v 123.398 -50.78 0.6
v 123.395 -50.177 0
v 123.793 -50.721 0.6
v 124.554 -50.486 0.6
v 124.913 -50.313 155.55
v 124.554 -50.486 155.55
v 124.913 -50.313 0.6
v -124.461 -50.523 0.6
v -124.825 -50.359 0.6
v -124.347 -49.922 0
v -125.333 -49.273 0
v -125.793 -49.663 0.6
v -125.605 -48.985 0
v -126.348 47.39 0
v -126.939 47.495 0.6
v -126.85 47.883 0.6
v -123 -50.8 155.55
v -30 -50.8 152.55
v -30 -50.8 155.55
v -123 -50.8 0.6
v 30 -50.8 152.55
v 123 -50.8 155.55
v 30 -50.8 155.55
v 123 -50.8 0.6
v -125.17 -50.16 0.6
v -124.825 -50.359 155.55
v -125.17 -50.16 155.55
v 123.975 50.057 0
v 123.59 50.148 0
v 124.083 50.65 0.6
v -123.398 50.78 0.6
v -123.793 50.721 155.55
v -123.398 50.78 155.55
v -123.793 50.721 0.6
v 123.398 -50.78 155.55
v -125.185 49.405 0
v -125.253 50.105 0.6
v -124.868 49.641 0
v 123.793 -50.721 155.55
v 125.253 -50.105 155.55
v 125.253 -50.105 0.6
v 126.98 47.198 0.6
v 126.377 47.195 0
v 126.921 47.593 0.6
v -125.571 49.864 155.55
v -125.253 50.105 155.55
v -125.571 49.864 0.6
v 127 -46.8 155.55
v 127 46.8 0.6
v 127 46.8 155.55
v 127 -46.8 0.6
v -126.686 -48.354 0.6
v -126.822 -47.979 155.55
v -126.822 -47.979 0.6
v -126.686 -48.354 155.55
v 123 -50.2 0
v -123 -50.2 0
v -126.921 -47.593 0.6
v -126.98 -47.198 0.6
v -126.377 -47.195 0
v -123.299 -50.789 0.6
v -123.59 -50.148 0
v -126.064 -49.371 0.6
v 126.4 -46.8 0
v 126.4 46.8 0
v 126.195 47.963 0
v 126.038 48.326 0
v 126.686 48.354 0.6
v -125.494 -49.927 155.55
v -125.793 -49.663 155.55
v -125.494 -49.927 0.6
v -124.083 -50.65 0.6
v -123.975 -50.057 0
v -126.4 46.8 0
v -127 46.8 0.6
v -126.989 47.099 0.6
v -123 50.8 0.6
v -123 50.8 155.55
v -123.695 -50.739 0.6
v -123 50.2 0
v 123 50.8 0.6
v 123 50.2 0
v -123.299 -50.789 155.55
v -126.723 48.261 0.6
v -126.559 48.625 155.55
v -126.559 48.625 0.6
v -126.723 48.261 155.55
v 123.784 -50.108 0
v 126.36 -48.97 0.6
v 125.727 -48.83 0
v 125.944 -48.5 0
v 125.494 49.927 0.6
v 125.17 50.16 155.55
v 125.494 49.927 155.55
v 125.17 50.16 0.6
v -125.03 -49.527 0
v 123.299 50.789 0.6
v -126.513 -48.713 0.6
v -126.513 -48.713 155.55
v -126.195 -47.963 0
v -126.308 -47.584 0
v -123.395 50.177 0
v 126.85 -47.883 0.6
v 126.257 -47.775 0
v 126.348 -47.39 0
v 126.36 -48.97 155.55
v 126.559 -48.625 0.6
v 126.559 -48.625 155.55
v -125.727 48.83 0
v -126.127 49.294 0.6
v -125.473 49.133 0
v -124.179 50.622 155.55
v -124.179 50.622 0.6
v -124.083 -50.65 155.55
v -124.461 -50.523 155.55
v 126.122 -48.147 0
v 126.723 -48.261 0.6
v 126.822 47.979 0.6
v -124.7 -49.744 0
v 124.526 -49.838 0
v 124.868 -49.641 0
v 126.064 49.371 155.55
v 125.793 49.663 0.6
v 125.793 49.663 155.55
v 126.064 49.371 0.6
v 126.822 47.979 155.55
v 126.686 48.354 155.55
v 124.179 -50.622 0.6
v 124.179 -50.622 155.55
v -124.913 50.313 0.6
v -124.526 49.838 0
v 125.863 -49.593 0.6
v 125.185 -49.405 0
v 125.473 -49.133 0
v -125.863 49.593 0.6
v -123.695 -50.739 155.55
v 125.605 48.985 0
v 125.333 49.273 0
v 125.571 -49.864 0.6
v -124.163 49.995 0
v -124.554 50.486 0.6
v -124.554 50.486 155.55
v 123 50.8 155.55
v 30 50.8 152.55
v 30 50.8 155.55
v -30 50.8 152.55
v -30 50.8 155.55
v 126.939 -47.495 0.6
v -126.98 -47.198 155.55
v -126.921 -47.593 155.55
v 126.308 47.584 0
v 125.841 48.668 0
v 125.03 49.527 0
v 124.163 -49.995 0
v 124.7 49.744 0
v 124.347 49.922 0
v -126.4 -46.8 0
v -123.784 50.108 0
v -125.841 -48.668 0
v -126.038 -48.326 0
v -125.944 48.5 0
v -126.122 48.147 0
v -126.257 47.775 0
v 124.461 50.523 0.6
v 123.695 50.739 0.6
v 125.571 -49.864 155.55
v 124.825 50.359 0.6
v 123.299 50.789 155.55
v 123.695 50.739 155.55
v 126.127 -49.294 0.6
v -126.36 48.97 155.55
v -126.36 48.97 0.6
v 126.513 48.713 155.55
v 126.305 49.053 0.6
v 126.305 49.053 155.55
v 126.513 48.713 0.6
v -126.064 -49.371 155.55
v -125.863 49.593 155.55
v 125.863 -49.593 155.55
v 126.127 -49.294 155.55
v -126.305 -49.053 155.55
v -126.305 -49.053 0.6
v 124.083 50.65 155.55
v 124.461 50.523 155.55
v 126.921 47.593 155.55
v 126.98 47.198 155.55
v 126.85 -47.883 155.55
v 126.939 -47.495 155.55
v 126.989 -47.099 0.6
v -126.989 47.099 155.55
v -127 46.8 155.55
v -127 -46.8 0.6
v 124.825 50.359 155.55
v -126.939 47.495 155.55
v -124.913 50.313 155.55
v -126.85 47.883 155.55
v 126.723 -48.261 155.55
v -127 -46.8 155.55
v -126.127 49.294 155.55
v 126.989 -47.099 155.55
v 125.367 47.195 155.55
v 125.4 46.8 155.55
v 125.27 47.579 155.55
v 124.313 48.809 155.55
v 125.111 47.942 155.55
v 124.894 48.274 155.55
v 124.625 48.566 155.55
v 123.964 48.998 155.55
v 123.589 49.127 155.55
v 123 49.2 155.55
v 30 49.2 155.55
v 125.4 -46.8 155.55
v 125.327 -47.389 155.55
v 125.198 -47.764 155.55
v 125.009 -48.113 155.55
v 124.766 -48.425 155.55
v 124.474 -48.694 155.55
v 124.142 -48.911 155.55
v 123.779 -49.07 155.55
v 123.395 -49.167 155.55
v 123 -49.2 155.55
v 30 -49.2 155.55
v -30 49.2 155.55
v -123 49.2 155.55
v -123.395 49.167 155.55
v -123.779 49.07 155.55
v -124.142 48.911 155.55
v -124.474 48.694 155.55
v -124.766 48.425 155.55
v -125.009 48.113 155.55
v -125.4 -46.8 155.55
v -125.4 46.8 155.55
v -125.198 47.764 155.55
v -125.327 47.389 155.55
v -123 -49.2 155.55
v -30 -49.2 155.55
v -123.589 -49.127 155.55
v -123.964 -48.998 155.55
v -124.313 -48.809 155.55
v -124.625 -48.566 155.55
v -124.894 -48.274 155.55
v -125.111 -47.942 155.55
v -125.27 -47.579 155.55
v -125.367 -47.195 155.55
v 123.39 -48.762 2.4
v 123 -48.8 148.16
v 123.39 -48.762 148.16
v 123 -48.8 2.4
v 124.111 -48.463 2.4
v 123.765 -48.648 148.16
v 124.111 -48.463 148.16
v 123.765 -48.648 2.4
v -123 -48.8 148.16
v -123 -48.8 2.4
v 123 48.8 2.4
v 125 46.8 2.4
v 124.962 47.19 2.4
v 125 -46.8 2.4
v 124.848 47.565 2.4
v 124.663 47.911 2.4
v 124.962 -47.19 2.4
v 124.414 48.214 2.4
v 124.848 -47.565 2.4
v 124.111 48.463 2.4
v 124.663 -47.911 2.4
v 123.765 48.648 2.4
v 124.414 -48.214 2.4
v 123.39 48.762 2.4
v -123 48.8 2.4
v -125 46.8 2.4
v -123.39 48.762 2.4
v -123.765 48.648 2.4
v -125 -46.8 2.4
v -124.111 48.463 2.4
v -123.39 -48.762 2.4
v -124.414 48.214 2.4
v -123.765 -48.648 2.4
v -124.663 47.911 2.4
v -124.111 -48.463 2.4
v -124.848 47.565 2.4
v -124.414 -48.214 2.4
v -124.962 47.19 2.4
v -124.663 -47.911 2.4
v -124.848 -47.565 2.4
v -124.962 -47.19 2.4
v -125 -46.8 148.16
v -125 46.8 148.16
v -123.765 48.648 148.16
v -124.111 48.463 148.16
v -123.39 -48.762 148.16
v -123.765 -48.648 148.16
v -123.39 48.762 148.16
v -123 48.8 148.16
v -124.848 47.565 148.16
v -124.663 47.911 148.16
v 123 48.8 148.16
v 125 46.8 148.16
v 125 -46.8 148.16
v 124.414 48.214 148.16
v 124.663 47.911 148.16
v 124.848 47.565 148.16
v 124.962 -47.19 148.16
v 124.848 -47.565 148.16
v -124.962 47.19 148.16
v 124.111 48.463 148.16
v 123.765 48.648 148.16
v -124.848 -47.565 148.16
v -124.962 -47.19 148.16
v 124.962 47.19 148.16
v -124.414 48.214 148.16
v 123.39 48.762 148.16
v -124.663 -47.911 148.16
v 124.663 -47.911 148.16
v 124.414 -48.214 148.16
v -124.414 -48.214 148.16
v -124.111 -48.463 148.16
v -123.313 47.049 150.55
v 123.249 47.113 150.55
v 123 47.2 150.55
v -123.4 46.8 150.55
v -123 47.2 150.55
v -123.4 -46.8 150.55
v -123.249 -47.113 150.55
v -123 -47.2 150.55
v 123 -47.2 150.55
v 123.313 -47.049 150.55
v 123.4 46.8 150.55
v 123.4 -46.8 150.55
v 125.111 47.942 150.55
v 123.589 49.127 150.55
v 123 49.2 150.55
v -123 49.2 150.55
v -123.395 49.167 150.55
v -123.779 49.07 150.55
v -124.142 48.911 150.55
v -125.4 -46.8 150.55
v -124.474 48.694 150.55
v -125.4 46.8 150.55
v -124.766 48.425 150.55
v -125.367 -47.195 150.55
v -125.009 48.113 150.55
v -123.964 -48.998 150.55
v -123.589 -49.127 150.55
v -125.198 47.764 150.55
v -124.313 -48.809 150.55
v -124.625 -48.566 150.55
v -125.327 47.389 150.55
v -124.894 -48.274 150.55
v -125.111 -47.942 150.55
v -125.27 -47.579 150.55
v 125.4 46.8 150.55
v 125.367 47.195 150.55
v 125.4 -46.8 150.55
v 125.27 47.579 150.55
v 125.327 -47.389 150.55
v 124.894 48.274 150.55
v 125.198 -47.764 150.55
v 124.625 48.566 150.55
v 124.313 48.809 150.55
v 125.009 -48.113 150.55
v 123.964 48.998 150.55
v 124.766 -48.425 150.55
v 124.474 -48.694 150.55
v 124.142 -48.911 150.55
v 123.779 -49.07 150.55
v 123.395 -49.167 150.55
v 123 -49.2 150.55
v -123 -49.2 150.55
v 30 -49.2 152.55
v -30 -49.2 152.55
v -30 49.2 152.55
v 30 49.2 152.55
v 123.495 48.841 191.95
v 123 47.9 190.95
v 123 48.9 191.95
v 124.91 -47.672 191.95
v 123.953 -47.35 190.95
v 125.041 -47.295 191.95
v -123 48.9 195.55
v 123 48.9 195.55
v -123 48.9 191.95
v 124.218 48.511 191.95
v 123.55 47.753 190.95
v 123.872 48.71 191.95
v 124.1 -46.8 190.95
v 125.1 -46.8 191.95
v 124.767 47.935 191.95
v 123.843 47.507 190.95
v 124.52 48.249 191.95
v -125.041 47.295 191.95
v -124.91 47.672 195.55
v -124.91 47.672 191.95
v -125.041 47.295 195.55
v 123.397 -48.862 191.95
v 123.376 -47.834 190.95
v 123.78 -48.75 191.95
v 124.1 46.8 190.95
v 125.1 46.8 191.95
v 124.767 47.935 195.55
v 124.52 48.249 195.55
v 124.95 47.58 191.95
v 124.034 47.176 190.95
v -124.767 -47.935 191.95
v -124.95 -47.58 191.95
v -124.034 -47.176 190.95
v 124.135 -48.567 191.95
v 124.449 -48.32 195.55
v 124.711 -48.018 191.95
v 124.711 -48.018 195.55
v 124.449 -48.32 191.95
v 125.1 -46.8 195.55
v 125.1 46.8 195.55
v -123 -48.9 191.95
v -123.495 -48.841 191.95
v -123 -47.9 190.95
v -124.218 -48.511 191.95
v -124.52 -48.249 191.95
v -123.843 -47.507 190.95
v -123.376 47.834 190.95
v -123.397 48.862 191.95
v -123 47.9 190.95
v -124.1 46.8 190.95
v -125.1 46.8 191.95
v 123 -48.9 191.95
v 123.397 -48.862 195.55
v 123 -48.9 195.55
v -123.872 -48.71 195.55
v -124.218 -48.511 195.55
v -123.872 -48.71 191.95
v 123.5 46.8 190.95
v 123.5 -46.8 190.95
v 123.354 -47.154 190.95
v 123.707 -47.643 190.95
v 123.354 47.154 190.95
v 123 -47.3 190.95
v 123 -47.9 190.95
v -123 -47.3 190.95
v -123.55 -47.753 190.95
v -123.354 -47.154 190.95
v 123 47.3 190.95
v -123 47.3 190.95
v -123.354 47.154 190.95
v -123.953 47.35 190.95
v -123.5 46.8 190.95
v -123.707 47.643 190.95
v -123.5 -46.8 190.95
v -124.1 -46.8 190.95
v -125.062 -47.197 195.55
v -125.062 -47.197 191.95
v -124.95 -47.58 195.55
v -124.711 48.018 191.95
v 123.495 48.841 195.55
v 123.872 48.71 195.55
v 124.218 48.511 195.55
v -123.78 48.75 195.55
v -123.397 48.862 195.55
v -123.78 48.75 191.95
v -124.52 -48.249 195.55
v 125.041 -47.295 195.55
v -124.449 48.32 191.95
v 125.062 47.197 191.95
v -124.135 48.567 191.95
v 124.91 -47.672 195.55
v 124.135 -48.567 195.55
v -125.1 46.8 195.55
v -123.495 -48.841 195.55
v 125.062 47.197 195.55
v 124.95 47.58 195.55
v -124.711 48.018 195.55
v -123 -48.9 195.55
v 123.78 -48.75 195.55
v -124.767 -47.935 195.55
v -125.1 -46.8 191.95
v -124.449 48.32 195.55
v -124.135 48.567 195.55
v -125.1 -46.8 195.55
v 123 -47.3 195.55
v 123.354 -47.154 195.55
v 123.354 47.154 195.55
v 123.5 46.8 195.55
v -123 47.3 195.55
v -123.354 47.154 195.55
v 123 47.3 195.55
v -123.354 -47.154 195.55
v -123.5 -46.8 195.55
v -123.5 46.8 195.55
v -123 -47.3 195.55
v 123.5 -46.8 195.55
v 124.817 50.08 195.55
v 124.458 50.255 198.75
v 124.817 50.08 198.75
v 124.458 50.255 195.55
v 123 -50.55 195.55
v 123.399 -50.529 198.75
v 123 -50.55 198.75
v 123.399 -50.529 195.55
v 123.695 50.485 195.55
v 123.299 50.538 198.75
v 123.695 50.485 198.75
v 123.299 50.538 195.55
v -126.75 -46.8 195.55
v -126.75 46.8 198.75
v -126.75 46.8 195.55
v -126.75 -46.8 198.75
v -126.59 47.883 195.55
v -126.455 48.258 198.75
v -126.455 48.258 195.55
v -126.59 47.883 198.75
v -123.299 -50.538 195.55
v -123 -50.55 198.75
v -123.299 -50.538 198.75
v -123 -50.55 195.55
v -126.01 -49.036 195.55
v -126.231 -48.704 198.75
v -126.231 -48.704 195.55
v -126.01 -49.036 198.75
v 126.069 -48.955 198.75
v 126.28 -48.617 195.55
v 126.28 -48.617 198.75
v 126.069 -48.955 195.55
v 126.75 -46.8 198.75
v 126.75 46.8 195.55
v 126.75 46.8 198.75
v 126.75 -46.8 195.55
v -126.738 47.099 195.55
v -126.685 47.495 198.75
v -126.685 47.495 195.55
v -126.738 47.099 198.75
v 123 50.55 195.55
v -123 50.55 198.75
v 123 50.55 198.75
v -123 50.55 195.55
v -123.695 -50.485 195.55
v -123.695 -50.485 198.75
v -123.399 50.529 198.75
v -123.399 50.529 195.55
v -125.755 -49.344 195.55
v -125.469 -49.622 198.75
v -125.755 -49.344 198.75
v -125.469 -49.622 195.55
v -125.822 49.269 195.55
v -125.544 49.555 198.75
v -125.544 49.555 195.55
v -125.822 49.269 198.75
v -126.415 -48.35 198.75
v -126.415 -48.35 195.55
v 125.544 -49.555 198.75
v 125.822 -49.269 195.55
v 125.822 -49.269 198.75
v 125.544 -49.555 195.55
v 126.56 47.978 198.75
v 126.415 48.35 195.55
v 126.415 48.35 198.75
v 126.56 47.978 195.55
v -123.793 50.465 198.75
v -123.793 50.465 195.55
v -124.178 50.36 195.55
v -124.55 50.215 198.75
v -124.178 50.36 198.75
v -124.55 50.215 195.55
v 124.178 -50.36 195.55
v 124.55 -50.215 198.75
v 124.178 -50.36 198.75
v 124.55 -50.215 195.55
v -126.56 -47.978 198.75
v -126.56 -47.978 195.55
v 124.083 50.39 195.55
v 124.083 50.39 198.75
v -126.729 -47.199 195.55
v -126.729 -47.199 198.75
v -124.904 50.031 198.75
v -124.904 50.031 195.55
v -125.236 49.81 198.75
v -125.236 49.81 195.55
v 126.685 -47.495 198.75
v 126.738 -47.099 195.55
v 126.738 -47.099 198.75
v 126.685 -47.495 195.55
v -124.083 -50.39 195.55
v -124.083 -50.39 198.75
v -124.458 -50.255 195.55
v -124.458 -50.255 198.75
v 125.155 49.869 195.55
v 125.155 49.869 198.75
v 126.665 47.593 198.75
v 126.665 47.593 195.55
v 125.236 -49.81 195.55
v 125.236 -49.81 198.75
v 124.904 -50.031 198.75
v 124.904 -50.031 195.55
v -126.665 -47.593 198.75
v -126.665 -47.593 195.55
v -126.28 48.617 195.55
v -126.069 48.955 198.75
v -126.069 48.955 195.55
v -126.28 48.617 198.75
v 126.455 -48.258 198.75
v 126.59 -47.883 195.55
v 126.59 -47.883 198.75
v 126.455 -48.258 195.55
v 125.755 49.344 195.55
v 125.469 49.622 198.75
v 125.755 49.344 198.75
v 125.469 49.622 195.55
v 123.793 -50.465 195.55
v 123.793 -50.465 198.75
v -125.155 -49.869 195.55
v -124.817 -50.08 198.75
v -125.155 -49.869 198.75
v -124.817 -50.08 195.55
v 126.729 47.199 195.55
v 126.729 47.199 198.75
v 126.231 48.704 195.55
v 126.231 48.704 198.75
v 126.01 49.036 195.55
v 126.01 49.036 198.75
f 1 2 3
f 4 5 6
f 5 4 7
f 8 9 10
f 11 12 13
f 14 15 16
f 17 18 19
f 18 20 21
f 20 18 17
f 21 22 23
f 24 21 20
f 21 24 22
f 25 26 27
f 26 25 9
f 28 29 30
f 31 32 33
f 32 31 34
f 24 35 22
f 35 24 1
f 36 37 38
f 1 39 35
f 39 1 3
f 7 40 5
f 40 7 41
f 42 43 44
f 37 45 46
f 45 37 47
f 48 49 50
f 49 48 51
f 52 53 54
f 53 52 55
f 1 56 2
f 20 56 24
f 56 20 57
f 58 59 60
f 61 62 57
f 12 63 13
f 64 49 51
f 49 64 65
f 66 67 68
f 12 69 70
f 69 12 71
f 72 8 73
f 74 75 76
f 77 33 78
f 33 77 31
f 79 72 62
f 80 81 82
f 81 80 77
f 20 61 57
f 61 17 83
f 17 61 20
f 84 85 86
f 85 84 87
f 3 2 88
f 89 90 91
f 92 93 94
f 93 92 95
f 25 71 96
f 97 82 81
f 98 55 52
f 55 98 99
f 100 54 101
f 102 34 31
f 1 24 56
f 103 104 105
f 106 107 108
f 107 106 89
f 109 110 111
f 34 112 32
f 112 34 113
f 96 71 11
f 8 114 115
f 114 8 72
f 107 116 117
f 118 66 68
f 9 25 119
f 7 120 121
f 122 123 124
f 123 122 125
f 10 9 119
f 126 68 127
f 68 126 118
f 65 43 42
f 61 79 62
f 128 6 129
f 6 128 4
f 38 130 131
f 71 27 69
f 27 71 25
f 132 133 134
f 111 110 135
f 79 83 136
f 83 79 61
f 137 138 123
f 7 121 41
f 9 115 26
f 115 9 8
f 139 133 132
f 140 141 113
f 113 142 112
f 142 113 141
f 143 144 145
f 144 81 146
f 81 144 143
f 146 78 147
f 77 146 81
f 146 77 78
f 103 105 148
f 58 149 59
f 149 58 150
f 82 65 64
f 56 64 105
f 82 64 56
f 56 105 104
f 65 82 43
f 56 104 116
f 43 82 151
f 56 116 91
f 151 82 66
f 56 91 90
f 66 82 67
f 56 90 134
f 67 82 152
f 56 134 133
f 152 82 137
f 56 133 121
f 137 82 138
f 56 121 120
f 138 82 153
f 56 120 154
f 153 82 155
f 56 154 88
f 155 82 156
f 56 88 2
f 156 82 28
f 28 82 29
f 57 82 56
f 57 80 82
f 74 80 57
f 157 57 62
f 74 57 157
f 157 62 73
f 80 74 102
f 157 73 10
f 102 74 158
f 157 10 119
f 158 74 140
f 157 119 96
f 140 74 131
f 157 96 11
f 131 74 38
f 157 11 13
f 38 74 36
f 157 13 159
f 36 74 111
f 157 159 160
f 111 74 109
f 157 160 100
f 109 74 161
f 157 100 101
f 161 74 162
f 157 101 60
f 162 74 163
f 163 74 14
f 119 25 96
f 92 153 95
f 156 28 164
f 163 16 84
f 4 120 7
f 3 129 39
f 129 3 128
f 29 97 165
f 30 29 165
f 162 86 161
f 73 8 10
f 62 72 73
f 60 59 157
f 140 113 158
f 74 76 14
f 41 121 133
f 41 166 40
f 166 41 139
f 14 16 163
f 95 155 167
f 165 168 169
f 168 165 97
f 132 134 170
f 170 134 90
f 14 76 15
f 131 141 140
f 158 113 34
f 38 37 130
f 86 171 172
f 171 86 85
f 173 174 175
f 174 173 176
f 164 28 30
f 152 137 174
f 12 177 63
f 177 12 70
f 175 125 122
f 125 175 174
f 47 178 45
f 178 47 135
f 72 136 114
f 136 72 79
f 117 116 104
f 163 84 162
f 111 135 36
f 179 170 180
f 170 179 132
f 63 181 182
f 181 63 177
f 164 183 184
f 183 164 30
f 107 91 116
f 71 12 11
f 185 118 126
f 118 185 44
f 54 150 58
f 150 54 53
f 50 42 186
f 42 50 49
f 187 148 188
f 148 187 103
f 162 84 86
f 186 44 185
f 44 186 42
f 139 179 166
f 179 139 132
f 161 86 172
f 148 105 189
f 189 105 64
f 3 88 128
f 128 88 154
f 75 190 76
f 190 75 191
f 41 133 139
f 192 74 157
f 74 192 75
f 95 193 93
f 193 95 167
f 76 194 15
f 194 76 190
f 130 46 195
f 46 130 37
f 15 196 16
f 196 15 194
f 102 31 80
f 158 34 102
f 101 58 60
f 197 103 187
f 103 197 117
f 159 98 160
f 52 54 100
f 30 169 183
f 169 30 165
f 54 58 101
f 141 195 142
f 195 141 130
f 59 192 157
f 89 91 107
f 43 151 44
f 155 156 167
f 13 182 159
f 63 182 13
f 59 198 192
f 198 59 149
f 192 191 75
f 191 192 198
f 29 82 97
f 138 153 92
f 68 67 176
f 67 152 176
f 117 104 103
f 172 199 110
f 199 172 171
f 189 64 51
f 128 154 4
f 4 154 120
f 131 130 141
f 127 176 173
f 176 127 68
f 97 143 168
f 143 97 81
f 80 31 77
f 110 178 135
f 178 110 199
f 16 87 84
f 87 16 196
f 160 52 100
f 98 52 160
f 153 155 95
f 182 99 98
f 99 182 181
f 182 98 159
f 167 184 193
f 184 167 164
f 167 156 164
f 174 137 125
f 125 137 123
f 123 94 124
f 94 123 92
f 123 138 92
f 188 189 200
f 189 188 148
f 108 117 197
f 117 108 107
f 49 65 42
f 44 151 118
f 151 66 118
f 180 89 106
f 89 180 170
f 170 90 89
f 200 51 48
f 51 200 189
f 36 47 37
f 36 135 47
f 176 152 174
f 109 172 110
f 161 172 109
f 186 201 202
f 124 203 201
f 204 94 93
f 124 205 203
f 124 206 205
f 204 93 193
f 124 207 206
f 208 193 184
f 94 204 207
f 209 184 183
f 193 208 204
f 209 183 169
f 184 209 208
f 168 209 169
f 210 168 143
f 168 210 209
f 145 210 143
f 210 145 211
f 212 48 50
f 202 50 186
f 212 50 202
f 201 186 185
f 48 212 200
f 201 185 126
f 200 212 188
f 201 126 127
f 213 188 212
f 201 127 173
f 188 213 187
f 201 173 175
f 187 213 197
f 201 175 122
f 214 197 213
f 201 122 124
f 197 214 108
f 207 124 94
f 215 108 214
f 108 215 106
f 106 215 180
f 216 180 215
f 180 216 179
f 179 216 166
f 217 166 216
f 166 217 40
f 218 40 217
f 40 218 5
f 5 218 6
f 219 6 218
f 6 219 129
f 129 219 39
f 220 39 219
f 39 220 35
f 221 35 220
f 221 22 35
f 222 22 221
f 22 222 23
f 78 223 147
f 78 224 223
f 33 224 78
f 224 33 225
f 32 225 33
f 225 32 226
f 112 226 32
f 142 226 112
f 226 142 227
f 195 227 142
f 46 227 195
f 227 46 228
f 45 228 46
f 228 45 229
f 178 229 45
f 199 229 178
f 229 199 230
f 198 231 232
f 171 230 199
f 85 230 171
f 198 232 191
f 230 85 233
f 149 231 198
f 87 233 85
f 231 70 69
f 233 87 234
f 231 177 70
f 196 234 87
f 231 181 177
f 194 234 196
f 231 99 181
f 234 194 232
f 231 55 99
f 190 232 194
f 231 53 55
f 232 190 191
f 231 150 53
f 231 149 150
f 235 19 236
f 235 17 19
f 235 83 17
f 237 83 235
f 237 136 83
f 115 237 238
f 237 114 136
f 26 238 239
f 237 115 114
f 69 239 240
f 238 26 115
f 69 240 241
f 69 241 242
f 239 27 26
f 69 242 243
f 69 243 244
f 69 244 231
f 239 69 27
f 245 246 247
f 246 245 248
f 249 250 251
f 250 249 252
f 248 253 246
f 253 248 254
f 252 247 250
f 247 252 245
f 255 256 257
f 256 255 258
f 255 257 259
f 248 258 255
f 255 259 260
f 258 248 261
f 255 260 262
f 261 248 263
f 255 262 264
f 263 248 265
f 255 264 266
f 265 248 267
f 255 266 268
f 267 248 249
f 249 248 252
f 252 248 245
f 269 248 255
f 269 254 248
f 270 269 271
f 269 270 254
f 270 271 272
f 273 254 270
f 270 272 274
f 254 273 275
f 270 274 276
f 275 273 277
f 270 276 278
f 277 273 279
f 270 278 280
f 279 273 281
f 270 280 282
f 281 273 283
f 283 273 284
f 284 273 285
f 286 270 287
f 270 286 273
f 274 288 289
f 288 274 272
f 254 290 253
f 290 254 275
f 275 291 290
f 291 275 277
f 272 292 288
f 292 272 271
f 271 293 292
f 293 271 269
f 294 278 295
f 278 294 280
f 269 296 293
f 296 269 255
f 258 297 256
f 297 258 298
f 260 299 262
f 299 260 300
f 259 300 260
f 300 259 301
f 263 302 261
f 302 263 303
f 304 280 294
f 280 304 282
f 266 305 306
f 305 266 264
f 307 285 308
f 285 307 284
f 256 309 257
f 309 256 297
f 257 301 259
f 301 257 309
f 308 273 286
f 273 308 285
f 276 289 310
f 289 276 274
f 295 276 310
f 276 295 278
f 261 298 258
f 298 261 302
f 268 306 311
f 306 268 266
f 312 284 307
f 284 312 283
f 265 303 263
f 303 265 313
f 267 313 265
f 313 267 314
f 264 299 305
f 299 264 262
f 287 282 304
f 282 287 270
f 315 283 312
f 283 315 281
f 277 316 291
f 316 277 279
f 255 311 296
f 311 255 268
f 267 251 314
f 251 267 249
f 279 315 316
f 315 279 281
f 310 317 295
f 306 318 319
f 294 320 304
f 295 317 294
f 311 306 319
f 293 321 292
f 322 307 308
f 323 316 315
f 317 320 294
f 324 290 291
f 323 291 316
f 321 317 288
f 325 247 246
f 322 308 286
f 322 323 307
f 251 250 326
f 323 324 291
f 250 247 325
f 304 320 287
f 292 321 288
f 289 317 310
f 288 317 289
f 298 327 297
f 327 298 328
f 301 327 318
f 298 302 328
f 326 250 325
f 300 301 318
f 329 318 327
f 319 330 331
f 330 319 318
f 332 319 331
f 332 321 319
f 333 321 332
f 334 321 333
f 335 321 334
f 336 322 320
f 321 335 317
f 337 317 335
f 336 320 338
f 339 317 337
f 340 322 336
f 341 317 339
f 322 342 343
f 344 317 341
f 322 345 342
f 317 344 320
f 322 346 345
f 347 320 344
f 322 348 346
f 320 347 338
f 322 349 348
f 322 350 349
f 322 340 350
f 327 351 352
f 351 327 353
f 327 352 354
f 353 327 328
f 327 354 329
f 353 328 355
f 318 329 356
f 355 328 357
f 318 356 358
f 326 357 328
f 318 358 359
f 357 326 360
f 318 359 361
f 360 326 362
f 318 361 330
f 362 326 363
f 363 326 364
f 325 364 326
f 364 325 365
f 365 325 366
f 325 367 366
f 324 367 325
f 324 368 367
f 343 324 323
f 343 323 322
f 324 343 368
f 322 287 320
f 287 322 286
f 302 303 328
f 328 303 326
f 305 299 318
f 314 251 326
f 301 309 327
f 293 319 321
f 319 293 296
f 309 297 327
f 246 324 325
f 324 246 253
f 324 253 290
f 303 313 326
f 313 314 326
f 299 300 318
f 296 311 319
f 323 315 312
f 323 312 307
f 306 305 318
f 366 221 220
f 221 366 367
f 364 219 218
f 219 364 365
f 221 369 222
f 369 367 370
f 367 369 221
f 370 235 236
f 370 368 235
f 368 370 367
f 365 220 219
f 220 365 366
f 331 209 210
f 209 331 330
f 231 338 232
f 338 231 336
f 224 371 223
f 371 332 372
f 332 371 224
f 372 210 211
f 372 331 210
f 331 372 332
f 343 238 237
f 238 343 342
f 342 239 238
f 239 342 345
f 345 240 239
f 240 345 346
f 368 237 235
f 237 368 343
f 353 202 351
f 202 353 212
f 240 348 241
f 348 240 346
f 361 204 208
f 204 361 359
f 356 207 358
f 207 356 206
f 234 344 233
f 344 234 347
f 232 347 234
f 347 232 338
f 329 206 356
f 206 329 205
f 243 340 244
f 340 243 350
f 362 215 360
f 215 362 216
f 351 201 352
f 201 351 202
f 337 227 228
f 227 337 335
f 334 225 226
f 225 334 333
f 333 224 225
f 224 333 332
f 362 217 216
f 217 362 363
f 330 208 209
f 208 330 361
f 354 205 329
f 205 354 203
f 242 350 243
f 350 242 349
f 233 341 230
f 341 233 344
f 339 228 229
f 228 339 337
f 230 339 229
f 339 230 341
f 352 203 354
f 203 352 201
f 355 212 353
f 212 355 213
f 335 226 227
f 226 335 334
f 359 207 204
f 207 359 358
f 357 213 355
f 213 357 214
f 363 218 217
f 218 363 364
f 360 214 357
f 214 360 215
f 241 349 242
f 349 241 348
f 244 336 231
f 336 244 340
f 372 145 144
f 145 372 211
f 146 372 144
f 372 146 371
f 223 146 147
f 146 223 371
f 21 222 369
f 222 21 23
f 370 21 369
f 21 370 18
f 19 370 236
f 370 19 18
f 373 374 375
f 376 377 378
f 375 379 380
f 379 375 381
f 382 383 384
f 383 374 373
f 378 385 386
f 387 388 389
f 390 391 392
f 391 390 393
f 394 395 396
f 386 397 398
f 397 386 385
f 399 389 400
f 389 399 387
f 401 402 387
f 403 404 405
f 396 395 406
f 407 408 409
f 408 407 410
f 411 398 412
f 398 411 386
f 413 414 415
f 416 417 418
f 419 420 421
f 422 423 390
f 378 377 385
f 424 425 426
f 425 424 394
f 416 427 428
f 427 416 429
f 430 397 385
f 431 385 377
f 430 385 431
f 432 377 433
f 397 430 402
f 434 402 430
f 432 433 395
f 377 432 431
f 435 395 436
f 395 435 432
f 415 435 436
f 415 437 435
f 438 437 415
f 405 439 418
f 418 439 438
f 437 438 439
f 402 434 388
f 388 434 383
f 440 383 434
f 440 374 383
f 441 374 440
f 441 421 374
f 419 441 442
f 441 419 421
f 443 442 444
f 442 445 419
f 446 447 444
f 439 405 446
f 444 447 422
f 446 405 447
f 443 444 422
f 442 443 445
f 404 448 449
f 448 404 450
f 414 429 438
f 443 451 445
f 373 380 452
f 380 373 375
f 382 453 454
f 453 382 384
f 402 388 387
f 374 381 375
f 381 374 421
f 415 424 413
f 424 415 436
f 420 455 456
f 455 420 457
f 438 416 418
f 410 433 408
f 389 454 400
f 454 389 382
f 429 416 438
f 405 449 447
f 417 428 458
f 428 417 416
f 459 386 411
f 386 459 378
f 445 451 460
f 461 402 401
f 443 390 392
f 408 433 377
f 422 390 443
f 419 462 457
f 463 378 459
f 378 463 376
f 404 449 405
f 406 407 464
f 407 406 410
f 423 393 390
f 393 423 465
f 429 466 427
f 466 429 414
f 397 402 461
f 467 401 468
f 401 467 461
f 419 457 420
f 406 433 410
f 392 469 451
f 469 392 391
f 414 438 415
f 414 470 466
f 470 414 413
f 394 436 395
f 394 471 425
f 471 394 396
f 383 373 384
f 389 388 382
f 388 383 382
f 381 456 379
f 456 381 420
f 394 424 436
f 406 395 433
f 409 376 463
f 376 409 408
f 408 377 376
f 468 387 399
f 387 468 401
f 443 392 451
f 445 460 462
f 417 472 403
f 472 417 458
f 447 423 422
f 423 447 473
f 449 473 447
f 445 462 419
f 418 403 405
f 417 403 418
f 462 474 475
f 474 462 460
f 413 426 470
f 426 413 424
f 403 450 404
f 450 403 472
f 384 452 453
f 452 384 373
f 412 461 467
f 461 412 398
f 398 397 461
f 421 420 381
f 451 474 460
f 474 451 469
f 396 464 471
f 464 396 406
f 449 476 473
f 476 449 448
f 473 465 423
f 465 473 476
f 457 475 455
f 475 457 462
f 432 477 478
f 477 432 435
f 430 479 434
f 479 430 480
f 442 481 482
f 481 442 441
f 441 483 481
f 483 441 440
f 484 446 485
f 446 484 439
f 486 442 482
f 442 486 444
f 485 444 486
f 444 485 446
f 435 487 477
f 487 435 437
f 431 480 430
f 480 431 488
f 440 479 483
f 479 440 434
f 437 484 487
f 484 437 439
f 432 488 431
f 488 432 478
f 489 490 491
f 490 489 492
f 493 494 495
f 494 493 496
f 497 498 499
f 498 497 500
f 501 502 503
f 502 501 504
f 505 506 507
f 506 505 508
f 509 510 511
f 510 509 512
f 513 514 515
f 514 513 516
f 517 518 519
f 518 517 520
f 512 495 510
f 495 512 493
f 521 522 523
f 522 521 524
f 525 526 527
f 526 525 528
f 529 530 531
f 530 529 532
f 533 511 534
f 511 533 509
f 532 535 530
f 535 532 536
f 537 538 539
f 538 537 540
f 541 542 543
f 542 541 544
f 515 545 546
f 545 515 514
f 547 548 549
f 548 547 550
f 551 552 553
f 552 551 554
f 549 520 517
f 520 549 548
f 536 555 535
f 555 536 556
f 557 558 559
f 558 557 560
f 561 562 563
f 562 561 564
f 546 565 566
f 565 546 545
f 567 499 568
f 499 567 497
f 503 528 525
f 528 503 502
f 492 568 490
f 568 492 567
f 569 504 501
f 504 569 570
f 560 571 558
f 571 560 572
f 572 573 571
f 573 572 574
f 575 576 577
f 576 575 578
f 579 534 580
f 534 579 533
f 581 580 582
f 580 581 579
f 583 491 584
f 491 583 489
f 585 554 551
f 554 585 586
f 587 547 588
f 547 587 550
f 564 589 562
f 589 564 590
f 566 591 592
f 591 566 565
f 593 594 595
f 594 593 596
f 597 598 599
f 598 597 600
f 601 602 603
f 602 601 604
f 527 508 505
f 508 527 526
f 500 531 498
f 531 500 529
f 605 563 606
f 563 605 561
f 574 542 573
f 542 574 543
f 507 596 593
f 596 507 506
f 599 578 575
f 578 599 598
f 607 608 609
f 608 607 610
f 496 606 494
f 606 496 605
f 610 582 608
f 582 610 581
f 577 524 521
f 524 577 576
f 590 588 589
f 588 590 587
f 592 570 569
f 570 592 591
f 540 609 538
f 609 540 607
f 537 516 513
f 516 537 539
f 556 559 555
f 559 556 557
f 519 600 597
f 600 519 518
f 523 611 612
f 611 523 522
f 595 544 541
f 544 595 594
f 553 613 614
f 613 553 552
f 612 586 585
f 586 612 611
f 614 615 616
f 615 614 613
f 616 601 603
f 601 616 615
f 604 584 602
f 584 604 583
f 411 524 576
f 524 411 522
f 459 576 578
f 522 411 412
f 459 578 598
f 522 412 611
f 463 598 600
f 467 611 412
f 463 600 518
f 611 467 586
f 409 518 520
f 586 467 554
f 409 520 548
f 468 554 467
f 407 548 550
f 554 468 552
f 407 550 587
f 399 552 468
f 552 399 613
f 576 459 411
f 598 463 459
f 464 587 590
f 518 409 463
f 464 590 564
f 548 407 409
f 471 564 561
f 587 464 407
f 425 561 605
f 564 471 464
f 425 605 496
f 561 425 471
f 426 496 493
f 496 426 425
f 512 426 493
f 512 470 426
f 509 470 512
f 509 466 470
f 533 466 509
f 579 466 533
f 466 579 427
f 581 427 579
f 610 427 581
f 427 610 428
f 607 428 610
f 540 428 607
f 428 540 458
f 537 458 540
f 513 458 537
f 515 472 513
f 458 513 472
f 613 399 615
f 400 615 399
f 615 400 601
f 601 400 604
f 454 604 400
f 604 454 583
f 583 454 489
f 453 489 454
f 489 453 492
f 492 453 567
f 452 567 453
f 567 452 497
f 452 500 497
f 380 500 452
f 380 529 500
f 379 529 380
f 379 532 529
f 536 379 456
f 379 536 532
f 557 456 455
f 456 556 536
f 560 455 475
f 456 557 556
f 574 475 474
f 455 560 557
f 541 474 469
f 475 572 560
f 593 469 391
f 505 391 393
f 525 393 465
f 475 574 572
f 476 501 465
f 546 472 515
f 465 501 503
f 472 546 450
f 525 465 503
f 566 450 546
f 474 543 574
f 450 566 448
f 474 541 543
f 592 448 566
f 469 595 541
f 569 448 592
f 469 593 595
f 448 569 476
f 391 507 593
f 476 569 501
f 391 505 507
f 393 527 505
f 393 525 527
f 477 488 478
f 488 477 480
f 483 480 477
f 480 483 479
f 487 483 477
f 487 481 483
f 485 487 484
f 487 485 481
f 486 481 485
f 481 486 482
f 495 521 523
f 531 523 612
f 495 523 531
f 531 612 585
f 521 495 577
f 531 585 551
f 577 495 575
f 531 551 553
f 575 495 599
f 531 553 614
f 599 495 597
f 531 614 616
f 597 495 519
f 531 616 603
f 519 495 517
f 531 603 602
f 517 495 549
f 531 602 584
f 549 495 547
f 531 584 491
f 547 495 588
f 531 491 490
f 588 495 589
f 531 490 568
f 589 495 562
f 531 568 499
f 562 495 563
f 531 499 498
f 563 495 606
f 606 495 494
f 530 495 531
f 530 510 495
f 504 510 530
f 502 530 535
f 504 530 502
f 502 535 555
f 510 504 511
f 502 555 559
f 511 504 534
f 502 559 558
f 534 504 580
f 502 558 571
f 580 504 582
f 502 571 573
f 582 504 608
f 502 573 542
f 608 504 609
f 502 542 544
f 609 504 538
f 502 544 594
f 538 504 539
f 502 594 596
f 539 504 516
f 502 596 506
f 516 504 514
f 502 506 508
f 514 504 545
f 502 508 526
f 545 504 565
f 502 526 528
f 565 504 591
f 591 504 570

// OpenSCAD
// photo_box — shipping box for photos, with a proud inset lid
//
// Two parts, single-colour PLA, both print without supports.
//   box  prints open-face-up, floor on the bed
//   lid  prints top-face-down, skirt pointing up
//
// The four numbers below are the ones to change. Everything else is
// derived, so the model stays coherent at any size.

// ---- outside envelope (lid on) ----------------------------------------
// HARD CONSTRAINT. No feature on either part may exceed these in any
// axis. Grips and the like are cut *into* the envelope, never added
// outside it. Checked against the exported meshes — see SPEC.md §9.
box_w = 254;      // 10"    width
box_d = 101.6;    // 4"     depth
box_h = 158.75;   // 6.25"  height, lid seated

// ---- thicknesses ------------------------------------------------------
wall_t  = 2.0;    // side walls        (5 perimeters @ 0.4)
floor_t = 2.4;    // box floor         (6 perimeters)
lid_t   = 3.2;    // lid plate         (8 perimeters)

// ---- lid interface ----------------------------------------------------
rabbet_h = 5.0;   // how far the ledge sits below the rim
ledge_w  = 2.0;   // horizontal width of the ledge
rim_t    = 1.6;   // standing rim above the ledge (4 perimeters)
ramp_h   = 2.4;   // ramp thickening the wall into the rabbet zone. Rises 2.4
                  // while growing 1.6 inward — 34 deg off vertical, so it sits
                  // clear of the 45 deg self-support limit rather than on it.
skirt_w  = 1.6;   // lid skirt thickness (4 perimeters)
clr      = 0.3;   // lateral clearance, skirt to rim (PLA)
seat_gap = 0.4;   // skirt clears the ledge — the rim is the seat, not the ledge

// ---- cosmetic / ergonomic --------------------------------------------
corner_r   = 4.0;  // outside corner radius
lid_relief = 0.25; // lid plate inset from the outer face, per side
skirt_cham = 1.0;  // 45 deg lead-in so the lid self-centres on the way in
foot_cham  = 0.6;  // bottom outer edge — chamfer, not a round (elephant's foot)

// Nail catch: a notch taken out of the BOX rim, front and back, leaving the
// lid edge overhanging a gap you put a fingernail into. Subtractive, so the
// grip costs no envelope.
//
// It is cut from the rim rather than the lid's underside because the plate
// only overhangs the skirt by 1.65 (lid_od/2 - skirt_od/2). Chamfering the
// lid deeper than that removes the plate from under the skirt and leaves the
// skirt bridging nail_w in mid-air. The rim has depth to give; the lid
// does not.
nail_d = 3.0;      // notch depth below the rim top
nail_w = 60.0;     // span along the edge, centred

// ---- output -----------------------------------------------------------
part = "both";     // "box" | "lid" | "both"

$fa = 2;
$fs = 0.4;

// ---- derived ----------------------------------------------------------
body_h   = box_h - lid_t;        // rim top: the lid plate sits on this
ledge_z  = body_h - rabbet_h;    // up-facing ledge surface
ramp_z   = ledge_z - ramp_h;     // where the wall starts thickening
top_wall = rim_t + ledge_w;      // wall thickness through the rabbet zone
skirt_h  = rabbet_h - seat_gap;  // skirt stops short of the ledge

// Rounded-rectangle prism, centred in x/y, rising from z = 0.
module rrect_prism(w, d, r, h) {
    rr = max(min(r, w / 2 - 0.01, d / 2 - 0.01), 0.01);
    linear_extrude(height = h)
        offset(r = rr)
            square([w - 2 * rr, d - 2 * rr], center = true);
}

// ---- box --------------------------------------------------------------

module box_outer() {
    // Chamfered foot, then a straight prism the rest of the way up.
    hull() {
        rrect_prism(box_w - 2 * foot_cham, box_d - 2 * foot_cham,
                    corner_r - foot_cham, 0.01);
        translate([0, 0, foot_cham]) rrect_prism(box_w, box_d, corner_r, 0.01);
    }
    translate([0, 0, foot_cham])
        rrect_prism(box_w, box_d, corner_r, body_h - foot_cham);
}

// The cavity is cut in three stacked pieces. Each one is *wider* than the
// piece below it or tapers into it, so every newly exposed surface faces up
// or sits at 45 deg — nothing to support.
module box_cavity() {
    // Main volume, floor up to the ramp.
    translate([0, 0, floor_t])
        rrect_prism(box_w - 2 * wall_t, box_d - 2 * wall_t,
                    corner_r - wall_t, ramp_z - floor_t + 0.01);

    // 45 deg ramp: the wall thickens inward from wall_t to top_wall, giving
    // the rabbet something solid to be cut out of and hooping the top of a
    // large thin-walled box.
    hull() {
        translate([0, 0, ramp_z])
            rrect_prism(box_w - 2 * wall_t, box_d - 2 * wall_t,
                        corner_r - wall_t, 0.01);
        translate([0, 0, ledge_z - 0.01])
            rrect_prism(box_w - 2 * top_wall, box_d - 2 * top_wall,
                        corner_r - top_wall, 0.01);
    }

    // Rabbet: a wider cut above the ledge leaves the ledge as an up-facing
    // shelf and the rim as a standing fin.
    translate([0, 0, ledge_z])
        rrect_prism(box_w - 2 * rim_t, box_d - 2 * rim_t,
                    corner_r - rim_t, rabbet_h + 1);
}

// Notch through the rim, front and back. Its floor faces up and its walls are
// vertical, so it costs the upright box print nothing. Inboard of the rim is
// already rabbet void, so the cut reaches past it harmlessly.
module nail_catch_cut() {
    for (s = [1, -1])
        translate([0, s * (box_d / 2 - 3), body_h - nail_d / 2 + 1])
            cube([nail_w, 10, nail_d + 2], center = true);
}

module box() {
    difference() {
        box_outer();
        box_cavity();
        nail_catch_cut();
    }
}

// ---- lid --------------------------------------------------------------
// Modelled in the assembled orientation: plate on top, skirt hanging down
// into the rabbet. Flipped for printing at the bottom of the file.

skirt_ow = box_w - 2 * rim_t - 2 * clr;
skirt_od = box_d - 2 * rim_t - 2 * clr;
skirt_or = corner_r - rim_t - clr;
skirt_z0 = body_h - skirt_h;

lid_ow = box_w - 2 * lid_relief;
lid_od = box_d - 2 * lid_relief;

module lid() {
    // Plain plate. The grip lives in the box rim, so nothing is cut from
    // here and the skirt keeps full plate under it.
    translate([0, 0, body_h])
        rrect_prism(lid_ow, lid_od, corner_r - lid_relief, lid_t);

    // Skirt: lateral register only. Its outer face runs against the rim's
    // inner face; a 45 deg lead-in lets it find the opening on the way down.
    difference() {
        union() {
            hull() {
                translate([0, 0, skirt_z0])
                    rrect_prism(skirt_ow - 2 * skirt_cham,
                                skirt_od - 2 * skirt_cham,
                                skirt_or - skirt_cham, 0.01);
                translate([0, 0, skirt_z0 + skirt_cham])
                    rrect_prism(skirt_ow, skirt_od, skirt_or, 0.01);
            }
            translate([0, 0, skirt_z0 + skirt_cham])
                rrect_prism(skirt_ow, skirt_od, skirt_or,
                            skirt_h - skirt_cham + 0.01);
        }
        translate([0, 0, skirt_z0 - 1])
            rrect_prism(skirt_ow - 2 * skirt_w, skirt_od - 2 * skirt_w,
                        skirt_or - skirt_w, skirt_h + 2);
    }
}

// Lid rotated onto its print orientation: visible face down on the bed.
module lid_printed() {
    translate([0, 0, box_h]) rotate([180, 0, 0]) lid();
}

// ---- output -----------------------------------------------------------

if (part == "box") {
    box();
} else if (part == "lid") {
    lid_printed();
} else if (part == "both") {
    // Exploded preview — lid lifted clear so the rabbet is visible.
    box();
    translate([0, 0, 40]) lid();
}
// Any other value emits nothing, so this file can be included and
// section-cut for debugging without drawing the whole model.
